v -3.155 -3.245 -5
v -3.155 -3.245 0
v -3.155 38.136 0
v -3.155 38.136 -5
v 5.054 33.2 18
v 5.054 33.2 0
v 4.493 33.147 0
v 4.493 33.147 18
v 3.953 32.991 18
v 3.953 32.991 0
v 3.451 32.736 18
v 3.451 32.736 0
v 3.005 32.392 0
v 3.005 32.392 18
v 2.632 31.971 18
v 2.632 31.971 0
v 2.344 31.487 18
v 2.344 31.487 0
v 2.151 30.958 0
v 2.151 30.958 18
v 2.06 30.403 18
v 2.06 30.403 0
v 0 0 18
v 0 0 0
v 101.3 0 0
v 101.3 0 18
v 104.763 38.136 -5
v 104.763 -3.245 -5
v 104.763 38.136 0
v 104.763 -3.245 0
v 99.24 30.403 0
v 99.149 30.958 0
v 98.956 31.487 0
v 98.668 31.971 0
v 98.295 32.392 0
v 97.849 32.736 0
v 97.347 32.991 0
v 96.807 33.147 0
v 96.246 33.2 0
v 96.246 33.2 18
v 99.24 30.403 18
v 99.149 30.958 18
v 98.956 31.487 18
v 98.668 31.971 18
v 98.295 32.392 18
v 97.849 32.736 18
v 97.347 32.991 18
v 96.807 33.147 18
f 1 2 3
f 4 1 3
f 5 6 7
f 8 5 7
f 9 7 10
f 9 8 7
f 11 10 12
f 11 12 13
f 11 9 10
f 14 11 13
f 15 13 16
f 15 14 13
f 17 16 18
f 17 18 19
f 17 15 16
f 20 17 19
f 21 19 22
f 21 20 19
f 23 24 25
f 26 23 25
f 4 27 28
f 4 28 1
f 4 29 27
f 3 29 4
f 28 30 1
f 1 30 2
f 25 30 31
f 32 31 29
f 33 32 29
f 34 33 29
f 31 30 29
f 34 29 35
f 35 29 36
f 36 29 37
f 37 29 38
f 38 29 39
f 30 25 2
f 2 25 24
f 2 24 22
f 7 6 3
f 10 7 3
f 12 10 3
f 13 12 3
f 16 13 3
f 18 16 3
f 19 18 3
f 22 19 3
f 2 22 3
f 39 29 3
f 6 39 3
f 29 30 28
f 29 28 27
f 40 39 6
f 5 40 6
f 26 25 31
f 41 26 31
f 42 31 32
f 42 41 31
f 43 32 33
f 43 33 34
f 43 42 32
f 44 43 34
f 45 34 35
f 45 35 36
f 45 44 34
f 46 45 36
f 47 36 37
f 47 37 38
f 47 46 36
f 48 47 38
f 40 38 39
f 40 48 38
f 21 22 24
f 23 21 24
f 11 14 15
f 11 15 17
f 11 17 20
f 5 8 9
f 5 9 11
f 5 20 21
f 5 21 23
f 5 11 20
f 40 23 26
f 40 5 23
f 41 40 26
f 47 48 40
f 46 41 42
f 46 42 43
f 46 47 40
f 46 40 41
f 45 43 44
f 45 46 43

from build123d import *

# Parameters (mm, degrees)
P_IDAT_VYSUNUT_M1_DEPTH = 18
ZAOBLIT1_R              = 3
SKICA2_W                = 107.918638888
SKICA2_H                = 41.380791124
P_IDAT_VYSUNUT_M2_DEPTH = 5


with BuildPart() as part:
    # Skica1 → Přidat vysunutím1 (new body)
    with BuildSketch(Plane.XY):
        Polygon((0, 0), (101.3, 0), (99.05, 33.2), (2.25, 33.2), align=None)
    extrude(amount=P_IDAT_VYSUNUT_M1_DEPTH)

    # Zaoblit1
    zaoblit1_edges = [part.edges().sort_by_distance(p)[0] for p in [
        (2.25, 33.2, 9),
        (99.05, 33.2, 9),
    ]]
    fillet(zaoblit1_edges, radius=ZAOBLIT1_R)

    # Skica2 → Přidat vysunutím2 (add)
    with BuildSketch(Plane(origin=(0, 0, 0), x_dir=(-1, 0, 0), z_dir=(0, 0, -1))):
        with Locations((-50.804022796, 17.445366235)):
            Rectangle(SKICA2_W, SKICA2_H)
    extrude(amount=P_IDAT_VYSUNUT_M2_DEPTH)


solid = part.part
